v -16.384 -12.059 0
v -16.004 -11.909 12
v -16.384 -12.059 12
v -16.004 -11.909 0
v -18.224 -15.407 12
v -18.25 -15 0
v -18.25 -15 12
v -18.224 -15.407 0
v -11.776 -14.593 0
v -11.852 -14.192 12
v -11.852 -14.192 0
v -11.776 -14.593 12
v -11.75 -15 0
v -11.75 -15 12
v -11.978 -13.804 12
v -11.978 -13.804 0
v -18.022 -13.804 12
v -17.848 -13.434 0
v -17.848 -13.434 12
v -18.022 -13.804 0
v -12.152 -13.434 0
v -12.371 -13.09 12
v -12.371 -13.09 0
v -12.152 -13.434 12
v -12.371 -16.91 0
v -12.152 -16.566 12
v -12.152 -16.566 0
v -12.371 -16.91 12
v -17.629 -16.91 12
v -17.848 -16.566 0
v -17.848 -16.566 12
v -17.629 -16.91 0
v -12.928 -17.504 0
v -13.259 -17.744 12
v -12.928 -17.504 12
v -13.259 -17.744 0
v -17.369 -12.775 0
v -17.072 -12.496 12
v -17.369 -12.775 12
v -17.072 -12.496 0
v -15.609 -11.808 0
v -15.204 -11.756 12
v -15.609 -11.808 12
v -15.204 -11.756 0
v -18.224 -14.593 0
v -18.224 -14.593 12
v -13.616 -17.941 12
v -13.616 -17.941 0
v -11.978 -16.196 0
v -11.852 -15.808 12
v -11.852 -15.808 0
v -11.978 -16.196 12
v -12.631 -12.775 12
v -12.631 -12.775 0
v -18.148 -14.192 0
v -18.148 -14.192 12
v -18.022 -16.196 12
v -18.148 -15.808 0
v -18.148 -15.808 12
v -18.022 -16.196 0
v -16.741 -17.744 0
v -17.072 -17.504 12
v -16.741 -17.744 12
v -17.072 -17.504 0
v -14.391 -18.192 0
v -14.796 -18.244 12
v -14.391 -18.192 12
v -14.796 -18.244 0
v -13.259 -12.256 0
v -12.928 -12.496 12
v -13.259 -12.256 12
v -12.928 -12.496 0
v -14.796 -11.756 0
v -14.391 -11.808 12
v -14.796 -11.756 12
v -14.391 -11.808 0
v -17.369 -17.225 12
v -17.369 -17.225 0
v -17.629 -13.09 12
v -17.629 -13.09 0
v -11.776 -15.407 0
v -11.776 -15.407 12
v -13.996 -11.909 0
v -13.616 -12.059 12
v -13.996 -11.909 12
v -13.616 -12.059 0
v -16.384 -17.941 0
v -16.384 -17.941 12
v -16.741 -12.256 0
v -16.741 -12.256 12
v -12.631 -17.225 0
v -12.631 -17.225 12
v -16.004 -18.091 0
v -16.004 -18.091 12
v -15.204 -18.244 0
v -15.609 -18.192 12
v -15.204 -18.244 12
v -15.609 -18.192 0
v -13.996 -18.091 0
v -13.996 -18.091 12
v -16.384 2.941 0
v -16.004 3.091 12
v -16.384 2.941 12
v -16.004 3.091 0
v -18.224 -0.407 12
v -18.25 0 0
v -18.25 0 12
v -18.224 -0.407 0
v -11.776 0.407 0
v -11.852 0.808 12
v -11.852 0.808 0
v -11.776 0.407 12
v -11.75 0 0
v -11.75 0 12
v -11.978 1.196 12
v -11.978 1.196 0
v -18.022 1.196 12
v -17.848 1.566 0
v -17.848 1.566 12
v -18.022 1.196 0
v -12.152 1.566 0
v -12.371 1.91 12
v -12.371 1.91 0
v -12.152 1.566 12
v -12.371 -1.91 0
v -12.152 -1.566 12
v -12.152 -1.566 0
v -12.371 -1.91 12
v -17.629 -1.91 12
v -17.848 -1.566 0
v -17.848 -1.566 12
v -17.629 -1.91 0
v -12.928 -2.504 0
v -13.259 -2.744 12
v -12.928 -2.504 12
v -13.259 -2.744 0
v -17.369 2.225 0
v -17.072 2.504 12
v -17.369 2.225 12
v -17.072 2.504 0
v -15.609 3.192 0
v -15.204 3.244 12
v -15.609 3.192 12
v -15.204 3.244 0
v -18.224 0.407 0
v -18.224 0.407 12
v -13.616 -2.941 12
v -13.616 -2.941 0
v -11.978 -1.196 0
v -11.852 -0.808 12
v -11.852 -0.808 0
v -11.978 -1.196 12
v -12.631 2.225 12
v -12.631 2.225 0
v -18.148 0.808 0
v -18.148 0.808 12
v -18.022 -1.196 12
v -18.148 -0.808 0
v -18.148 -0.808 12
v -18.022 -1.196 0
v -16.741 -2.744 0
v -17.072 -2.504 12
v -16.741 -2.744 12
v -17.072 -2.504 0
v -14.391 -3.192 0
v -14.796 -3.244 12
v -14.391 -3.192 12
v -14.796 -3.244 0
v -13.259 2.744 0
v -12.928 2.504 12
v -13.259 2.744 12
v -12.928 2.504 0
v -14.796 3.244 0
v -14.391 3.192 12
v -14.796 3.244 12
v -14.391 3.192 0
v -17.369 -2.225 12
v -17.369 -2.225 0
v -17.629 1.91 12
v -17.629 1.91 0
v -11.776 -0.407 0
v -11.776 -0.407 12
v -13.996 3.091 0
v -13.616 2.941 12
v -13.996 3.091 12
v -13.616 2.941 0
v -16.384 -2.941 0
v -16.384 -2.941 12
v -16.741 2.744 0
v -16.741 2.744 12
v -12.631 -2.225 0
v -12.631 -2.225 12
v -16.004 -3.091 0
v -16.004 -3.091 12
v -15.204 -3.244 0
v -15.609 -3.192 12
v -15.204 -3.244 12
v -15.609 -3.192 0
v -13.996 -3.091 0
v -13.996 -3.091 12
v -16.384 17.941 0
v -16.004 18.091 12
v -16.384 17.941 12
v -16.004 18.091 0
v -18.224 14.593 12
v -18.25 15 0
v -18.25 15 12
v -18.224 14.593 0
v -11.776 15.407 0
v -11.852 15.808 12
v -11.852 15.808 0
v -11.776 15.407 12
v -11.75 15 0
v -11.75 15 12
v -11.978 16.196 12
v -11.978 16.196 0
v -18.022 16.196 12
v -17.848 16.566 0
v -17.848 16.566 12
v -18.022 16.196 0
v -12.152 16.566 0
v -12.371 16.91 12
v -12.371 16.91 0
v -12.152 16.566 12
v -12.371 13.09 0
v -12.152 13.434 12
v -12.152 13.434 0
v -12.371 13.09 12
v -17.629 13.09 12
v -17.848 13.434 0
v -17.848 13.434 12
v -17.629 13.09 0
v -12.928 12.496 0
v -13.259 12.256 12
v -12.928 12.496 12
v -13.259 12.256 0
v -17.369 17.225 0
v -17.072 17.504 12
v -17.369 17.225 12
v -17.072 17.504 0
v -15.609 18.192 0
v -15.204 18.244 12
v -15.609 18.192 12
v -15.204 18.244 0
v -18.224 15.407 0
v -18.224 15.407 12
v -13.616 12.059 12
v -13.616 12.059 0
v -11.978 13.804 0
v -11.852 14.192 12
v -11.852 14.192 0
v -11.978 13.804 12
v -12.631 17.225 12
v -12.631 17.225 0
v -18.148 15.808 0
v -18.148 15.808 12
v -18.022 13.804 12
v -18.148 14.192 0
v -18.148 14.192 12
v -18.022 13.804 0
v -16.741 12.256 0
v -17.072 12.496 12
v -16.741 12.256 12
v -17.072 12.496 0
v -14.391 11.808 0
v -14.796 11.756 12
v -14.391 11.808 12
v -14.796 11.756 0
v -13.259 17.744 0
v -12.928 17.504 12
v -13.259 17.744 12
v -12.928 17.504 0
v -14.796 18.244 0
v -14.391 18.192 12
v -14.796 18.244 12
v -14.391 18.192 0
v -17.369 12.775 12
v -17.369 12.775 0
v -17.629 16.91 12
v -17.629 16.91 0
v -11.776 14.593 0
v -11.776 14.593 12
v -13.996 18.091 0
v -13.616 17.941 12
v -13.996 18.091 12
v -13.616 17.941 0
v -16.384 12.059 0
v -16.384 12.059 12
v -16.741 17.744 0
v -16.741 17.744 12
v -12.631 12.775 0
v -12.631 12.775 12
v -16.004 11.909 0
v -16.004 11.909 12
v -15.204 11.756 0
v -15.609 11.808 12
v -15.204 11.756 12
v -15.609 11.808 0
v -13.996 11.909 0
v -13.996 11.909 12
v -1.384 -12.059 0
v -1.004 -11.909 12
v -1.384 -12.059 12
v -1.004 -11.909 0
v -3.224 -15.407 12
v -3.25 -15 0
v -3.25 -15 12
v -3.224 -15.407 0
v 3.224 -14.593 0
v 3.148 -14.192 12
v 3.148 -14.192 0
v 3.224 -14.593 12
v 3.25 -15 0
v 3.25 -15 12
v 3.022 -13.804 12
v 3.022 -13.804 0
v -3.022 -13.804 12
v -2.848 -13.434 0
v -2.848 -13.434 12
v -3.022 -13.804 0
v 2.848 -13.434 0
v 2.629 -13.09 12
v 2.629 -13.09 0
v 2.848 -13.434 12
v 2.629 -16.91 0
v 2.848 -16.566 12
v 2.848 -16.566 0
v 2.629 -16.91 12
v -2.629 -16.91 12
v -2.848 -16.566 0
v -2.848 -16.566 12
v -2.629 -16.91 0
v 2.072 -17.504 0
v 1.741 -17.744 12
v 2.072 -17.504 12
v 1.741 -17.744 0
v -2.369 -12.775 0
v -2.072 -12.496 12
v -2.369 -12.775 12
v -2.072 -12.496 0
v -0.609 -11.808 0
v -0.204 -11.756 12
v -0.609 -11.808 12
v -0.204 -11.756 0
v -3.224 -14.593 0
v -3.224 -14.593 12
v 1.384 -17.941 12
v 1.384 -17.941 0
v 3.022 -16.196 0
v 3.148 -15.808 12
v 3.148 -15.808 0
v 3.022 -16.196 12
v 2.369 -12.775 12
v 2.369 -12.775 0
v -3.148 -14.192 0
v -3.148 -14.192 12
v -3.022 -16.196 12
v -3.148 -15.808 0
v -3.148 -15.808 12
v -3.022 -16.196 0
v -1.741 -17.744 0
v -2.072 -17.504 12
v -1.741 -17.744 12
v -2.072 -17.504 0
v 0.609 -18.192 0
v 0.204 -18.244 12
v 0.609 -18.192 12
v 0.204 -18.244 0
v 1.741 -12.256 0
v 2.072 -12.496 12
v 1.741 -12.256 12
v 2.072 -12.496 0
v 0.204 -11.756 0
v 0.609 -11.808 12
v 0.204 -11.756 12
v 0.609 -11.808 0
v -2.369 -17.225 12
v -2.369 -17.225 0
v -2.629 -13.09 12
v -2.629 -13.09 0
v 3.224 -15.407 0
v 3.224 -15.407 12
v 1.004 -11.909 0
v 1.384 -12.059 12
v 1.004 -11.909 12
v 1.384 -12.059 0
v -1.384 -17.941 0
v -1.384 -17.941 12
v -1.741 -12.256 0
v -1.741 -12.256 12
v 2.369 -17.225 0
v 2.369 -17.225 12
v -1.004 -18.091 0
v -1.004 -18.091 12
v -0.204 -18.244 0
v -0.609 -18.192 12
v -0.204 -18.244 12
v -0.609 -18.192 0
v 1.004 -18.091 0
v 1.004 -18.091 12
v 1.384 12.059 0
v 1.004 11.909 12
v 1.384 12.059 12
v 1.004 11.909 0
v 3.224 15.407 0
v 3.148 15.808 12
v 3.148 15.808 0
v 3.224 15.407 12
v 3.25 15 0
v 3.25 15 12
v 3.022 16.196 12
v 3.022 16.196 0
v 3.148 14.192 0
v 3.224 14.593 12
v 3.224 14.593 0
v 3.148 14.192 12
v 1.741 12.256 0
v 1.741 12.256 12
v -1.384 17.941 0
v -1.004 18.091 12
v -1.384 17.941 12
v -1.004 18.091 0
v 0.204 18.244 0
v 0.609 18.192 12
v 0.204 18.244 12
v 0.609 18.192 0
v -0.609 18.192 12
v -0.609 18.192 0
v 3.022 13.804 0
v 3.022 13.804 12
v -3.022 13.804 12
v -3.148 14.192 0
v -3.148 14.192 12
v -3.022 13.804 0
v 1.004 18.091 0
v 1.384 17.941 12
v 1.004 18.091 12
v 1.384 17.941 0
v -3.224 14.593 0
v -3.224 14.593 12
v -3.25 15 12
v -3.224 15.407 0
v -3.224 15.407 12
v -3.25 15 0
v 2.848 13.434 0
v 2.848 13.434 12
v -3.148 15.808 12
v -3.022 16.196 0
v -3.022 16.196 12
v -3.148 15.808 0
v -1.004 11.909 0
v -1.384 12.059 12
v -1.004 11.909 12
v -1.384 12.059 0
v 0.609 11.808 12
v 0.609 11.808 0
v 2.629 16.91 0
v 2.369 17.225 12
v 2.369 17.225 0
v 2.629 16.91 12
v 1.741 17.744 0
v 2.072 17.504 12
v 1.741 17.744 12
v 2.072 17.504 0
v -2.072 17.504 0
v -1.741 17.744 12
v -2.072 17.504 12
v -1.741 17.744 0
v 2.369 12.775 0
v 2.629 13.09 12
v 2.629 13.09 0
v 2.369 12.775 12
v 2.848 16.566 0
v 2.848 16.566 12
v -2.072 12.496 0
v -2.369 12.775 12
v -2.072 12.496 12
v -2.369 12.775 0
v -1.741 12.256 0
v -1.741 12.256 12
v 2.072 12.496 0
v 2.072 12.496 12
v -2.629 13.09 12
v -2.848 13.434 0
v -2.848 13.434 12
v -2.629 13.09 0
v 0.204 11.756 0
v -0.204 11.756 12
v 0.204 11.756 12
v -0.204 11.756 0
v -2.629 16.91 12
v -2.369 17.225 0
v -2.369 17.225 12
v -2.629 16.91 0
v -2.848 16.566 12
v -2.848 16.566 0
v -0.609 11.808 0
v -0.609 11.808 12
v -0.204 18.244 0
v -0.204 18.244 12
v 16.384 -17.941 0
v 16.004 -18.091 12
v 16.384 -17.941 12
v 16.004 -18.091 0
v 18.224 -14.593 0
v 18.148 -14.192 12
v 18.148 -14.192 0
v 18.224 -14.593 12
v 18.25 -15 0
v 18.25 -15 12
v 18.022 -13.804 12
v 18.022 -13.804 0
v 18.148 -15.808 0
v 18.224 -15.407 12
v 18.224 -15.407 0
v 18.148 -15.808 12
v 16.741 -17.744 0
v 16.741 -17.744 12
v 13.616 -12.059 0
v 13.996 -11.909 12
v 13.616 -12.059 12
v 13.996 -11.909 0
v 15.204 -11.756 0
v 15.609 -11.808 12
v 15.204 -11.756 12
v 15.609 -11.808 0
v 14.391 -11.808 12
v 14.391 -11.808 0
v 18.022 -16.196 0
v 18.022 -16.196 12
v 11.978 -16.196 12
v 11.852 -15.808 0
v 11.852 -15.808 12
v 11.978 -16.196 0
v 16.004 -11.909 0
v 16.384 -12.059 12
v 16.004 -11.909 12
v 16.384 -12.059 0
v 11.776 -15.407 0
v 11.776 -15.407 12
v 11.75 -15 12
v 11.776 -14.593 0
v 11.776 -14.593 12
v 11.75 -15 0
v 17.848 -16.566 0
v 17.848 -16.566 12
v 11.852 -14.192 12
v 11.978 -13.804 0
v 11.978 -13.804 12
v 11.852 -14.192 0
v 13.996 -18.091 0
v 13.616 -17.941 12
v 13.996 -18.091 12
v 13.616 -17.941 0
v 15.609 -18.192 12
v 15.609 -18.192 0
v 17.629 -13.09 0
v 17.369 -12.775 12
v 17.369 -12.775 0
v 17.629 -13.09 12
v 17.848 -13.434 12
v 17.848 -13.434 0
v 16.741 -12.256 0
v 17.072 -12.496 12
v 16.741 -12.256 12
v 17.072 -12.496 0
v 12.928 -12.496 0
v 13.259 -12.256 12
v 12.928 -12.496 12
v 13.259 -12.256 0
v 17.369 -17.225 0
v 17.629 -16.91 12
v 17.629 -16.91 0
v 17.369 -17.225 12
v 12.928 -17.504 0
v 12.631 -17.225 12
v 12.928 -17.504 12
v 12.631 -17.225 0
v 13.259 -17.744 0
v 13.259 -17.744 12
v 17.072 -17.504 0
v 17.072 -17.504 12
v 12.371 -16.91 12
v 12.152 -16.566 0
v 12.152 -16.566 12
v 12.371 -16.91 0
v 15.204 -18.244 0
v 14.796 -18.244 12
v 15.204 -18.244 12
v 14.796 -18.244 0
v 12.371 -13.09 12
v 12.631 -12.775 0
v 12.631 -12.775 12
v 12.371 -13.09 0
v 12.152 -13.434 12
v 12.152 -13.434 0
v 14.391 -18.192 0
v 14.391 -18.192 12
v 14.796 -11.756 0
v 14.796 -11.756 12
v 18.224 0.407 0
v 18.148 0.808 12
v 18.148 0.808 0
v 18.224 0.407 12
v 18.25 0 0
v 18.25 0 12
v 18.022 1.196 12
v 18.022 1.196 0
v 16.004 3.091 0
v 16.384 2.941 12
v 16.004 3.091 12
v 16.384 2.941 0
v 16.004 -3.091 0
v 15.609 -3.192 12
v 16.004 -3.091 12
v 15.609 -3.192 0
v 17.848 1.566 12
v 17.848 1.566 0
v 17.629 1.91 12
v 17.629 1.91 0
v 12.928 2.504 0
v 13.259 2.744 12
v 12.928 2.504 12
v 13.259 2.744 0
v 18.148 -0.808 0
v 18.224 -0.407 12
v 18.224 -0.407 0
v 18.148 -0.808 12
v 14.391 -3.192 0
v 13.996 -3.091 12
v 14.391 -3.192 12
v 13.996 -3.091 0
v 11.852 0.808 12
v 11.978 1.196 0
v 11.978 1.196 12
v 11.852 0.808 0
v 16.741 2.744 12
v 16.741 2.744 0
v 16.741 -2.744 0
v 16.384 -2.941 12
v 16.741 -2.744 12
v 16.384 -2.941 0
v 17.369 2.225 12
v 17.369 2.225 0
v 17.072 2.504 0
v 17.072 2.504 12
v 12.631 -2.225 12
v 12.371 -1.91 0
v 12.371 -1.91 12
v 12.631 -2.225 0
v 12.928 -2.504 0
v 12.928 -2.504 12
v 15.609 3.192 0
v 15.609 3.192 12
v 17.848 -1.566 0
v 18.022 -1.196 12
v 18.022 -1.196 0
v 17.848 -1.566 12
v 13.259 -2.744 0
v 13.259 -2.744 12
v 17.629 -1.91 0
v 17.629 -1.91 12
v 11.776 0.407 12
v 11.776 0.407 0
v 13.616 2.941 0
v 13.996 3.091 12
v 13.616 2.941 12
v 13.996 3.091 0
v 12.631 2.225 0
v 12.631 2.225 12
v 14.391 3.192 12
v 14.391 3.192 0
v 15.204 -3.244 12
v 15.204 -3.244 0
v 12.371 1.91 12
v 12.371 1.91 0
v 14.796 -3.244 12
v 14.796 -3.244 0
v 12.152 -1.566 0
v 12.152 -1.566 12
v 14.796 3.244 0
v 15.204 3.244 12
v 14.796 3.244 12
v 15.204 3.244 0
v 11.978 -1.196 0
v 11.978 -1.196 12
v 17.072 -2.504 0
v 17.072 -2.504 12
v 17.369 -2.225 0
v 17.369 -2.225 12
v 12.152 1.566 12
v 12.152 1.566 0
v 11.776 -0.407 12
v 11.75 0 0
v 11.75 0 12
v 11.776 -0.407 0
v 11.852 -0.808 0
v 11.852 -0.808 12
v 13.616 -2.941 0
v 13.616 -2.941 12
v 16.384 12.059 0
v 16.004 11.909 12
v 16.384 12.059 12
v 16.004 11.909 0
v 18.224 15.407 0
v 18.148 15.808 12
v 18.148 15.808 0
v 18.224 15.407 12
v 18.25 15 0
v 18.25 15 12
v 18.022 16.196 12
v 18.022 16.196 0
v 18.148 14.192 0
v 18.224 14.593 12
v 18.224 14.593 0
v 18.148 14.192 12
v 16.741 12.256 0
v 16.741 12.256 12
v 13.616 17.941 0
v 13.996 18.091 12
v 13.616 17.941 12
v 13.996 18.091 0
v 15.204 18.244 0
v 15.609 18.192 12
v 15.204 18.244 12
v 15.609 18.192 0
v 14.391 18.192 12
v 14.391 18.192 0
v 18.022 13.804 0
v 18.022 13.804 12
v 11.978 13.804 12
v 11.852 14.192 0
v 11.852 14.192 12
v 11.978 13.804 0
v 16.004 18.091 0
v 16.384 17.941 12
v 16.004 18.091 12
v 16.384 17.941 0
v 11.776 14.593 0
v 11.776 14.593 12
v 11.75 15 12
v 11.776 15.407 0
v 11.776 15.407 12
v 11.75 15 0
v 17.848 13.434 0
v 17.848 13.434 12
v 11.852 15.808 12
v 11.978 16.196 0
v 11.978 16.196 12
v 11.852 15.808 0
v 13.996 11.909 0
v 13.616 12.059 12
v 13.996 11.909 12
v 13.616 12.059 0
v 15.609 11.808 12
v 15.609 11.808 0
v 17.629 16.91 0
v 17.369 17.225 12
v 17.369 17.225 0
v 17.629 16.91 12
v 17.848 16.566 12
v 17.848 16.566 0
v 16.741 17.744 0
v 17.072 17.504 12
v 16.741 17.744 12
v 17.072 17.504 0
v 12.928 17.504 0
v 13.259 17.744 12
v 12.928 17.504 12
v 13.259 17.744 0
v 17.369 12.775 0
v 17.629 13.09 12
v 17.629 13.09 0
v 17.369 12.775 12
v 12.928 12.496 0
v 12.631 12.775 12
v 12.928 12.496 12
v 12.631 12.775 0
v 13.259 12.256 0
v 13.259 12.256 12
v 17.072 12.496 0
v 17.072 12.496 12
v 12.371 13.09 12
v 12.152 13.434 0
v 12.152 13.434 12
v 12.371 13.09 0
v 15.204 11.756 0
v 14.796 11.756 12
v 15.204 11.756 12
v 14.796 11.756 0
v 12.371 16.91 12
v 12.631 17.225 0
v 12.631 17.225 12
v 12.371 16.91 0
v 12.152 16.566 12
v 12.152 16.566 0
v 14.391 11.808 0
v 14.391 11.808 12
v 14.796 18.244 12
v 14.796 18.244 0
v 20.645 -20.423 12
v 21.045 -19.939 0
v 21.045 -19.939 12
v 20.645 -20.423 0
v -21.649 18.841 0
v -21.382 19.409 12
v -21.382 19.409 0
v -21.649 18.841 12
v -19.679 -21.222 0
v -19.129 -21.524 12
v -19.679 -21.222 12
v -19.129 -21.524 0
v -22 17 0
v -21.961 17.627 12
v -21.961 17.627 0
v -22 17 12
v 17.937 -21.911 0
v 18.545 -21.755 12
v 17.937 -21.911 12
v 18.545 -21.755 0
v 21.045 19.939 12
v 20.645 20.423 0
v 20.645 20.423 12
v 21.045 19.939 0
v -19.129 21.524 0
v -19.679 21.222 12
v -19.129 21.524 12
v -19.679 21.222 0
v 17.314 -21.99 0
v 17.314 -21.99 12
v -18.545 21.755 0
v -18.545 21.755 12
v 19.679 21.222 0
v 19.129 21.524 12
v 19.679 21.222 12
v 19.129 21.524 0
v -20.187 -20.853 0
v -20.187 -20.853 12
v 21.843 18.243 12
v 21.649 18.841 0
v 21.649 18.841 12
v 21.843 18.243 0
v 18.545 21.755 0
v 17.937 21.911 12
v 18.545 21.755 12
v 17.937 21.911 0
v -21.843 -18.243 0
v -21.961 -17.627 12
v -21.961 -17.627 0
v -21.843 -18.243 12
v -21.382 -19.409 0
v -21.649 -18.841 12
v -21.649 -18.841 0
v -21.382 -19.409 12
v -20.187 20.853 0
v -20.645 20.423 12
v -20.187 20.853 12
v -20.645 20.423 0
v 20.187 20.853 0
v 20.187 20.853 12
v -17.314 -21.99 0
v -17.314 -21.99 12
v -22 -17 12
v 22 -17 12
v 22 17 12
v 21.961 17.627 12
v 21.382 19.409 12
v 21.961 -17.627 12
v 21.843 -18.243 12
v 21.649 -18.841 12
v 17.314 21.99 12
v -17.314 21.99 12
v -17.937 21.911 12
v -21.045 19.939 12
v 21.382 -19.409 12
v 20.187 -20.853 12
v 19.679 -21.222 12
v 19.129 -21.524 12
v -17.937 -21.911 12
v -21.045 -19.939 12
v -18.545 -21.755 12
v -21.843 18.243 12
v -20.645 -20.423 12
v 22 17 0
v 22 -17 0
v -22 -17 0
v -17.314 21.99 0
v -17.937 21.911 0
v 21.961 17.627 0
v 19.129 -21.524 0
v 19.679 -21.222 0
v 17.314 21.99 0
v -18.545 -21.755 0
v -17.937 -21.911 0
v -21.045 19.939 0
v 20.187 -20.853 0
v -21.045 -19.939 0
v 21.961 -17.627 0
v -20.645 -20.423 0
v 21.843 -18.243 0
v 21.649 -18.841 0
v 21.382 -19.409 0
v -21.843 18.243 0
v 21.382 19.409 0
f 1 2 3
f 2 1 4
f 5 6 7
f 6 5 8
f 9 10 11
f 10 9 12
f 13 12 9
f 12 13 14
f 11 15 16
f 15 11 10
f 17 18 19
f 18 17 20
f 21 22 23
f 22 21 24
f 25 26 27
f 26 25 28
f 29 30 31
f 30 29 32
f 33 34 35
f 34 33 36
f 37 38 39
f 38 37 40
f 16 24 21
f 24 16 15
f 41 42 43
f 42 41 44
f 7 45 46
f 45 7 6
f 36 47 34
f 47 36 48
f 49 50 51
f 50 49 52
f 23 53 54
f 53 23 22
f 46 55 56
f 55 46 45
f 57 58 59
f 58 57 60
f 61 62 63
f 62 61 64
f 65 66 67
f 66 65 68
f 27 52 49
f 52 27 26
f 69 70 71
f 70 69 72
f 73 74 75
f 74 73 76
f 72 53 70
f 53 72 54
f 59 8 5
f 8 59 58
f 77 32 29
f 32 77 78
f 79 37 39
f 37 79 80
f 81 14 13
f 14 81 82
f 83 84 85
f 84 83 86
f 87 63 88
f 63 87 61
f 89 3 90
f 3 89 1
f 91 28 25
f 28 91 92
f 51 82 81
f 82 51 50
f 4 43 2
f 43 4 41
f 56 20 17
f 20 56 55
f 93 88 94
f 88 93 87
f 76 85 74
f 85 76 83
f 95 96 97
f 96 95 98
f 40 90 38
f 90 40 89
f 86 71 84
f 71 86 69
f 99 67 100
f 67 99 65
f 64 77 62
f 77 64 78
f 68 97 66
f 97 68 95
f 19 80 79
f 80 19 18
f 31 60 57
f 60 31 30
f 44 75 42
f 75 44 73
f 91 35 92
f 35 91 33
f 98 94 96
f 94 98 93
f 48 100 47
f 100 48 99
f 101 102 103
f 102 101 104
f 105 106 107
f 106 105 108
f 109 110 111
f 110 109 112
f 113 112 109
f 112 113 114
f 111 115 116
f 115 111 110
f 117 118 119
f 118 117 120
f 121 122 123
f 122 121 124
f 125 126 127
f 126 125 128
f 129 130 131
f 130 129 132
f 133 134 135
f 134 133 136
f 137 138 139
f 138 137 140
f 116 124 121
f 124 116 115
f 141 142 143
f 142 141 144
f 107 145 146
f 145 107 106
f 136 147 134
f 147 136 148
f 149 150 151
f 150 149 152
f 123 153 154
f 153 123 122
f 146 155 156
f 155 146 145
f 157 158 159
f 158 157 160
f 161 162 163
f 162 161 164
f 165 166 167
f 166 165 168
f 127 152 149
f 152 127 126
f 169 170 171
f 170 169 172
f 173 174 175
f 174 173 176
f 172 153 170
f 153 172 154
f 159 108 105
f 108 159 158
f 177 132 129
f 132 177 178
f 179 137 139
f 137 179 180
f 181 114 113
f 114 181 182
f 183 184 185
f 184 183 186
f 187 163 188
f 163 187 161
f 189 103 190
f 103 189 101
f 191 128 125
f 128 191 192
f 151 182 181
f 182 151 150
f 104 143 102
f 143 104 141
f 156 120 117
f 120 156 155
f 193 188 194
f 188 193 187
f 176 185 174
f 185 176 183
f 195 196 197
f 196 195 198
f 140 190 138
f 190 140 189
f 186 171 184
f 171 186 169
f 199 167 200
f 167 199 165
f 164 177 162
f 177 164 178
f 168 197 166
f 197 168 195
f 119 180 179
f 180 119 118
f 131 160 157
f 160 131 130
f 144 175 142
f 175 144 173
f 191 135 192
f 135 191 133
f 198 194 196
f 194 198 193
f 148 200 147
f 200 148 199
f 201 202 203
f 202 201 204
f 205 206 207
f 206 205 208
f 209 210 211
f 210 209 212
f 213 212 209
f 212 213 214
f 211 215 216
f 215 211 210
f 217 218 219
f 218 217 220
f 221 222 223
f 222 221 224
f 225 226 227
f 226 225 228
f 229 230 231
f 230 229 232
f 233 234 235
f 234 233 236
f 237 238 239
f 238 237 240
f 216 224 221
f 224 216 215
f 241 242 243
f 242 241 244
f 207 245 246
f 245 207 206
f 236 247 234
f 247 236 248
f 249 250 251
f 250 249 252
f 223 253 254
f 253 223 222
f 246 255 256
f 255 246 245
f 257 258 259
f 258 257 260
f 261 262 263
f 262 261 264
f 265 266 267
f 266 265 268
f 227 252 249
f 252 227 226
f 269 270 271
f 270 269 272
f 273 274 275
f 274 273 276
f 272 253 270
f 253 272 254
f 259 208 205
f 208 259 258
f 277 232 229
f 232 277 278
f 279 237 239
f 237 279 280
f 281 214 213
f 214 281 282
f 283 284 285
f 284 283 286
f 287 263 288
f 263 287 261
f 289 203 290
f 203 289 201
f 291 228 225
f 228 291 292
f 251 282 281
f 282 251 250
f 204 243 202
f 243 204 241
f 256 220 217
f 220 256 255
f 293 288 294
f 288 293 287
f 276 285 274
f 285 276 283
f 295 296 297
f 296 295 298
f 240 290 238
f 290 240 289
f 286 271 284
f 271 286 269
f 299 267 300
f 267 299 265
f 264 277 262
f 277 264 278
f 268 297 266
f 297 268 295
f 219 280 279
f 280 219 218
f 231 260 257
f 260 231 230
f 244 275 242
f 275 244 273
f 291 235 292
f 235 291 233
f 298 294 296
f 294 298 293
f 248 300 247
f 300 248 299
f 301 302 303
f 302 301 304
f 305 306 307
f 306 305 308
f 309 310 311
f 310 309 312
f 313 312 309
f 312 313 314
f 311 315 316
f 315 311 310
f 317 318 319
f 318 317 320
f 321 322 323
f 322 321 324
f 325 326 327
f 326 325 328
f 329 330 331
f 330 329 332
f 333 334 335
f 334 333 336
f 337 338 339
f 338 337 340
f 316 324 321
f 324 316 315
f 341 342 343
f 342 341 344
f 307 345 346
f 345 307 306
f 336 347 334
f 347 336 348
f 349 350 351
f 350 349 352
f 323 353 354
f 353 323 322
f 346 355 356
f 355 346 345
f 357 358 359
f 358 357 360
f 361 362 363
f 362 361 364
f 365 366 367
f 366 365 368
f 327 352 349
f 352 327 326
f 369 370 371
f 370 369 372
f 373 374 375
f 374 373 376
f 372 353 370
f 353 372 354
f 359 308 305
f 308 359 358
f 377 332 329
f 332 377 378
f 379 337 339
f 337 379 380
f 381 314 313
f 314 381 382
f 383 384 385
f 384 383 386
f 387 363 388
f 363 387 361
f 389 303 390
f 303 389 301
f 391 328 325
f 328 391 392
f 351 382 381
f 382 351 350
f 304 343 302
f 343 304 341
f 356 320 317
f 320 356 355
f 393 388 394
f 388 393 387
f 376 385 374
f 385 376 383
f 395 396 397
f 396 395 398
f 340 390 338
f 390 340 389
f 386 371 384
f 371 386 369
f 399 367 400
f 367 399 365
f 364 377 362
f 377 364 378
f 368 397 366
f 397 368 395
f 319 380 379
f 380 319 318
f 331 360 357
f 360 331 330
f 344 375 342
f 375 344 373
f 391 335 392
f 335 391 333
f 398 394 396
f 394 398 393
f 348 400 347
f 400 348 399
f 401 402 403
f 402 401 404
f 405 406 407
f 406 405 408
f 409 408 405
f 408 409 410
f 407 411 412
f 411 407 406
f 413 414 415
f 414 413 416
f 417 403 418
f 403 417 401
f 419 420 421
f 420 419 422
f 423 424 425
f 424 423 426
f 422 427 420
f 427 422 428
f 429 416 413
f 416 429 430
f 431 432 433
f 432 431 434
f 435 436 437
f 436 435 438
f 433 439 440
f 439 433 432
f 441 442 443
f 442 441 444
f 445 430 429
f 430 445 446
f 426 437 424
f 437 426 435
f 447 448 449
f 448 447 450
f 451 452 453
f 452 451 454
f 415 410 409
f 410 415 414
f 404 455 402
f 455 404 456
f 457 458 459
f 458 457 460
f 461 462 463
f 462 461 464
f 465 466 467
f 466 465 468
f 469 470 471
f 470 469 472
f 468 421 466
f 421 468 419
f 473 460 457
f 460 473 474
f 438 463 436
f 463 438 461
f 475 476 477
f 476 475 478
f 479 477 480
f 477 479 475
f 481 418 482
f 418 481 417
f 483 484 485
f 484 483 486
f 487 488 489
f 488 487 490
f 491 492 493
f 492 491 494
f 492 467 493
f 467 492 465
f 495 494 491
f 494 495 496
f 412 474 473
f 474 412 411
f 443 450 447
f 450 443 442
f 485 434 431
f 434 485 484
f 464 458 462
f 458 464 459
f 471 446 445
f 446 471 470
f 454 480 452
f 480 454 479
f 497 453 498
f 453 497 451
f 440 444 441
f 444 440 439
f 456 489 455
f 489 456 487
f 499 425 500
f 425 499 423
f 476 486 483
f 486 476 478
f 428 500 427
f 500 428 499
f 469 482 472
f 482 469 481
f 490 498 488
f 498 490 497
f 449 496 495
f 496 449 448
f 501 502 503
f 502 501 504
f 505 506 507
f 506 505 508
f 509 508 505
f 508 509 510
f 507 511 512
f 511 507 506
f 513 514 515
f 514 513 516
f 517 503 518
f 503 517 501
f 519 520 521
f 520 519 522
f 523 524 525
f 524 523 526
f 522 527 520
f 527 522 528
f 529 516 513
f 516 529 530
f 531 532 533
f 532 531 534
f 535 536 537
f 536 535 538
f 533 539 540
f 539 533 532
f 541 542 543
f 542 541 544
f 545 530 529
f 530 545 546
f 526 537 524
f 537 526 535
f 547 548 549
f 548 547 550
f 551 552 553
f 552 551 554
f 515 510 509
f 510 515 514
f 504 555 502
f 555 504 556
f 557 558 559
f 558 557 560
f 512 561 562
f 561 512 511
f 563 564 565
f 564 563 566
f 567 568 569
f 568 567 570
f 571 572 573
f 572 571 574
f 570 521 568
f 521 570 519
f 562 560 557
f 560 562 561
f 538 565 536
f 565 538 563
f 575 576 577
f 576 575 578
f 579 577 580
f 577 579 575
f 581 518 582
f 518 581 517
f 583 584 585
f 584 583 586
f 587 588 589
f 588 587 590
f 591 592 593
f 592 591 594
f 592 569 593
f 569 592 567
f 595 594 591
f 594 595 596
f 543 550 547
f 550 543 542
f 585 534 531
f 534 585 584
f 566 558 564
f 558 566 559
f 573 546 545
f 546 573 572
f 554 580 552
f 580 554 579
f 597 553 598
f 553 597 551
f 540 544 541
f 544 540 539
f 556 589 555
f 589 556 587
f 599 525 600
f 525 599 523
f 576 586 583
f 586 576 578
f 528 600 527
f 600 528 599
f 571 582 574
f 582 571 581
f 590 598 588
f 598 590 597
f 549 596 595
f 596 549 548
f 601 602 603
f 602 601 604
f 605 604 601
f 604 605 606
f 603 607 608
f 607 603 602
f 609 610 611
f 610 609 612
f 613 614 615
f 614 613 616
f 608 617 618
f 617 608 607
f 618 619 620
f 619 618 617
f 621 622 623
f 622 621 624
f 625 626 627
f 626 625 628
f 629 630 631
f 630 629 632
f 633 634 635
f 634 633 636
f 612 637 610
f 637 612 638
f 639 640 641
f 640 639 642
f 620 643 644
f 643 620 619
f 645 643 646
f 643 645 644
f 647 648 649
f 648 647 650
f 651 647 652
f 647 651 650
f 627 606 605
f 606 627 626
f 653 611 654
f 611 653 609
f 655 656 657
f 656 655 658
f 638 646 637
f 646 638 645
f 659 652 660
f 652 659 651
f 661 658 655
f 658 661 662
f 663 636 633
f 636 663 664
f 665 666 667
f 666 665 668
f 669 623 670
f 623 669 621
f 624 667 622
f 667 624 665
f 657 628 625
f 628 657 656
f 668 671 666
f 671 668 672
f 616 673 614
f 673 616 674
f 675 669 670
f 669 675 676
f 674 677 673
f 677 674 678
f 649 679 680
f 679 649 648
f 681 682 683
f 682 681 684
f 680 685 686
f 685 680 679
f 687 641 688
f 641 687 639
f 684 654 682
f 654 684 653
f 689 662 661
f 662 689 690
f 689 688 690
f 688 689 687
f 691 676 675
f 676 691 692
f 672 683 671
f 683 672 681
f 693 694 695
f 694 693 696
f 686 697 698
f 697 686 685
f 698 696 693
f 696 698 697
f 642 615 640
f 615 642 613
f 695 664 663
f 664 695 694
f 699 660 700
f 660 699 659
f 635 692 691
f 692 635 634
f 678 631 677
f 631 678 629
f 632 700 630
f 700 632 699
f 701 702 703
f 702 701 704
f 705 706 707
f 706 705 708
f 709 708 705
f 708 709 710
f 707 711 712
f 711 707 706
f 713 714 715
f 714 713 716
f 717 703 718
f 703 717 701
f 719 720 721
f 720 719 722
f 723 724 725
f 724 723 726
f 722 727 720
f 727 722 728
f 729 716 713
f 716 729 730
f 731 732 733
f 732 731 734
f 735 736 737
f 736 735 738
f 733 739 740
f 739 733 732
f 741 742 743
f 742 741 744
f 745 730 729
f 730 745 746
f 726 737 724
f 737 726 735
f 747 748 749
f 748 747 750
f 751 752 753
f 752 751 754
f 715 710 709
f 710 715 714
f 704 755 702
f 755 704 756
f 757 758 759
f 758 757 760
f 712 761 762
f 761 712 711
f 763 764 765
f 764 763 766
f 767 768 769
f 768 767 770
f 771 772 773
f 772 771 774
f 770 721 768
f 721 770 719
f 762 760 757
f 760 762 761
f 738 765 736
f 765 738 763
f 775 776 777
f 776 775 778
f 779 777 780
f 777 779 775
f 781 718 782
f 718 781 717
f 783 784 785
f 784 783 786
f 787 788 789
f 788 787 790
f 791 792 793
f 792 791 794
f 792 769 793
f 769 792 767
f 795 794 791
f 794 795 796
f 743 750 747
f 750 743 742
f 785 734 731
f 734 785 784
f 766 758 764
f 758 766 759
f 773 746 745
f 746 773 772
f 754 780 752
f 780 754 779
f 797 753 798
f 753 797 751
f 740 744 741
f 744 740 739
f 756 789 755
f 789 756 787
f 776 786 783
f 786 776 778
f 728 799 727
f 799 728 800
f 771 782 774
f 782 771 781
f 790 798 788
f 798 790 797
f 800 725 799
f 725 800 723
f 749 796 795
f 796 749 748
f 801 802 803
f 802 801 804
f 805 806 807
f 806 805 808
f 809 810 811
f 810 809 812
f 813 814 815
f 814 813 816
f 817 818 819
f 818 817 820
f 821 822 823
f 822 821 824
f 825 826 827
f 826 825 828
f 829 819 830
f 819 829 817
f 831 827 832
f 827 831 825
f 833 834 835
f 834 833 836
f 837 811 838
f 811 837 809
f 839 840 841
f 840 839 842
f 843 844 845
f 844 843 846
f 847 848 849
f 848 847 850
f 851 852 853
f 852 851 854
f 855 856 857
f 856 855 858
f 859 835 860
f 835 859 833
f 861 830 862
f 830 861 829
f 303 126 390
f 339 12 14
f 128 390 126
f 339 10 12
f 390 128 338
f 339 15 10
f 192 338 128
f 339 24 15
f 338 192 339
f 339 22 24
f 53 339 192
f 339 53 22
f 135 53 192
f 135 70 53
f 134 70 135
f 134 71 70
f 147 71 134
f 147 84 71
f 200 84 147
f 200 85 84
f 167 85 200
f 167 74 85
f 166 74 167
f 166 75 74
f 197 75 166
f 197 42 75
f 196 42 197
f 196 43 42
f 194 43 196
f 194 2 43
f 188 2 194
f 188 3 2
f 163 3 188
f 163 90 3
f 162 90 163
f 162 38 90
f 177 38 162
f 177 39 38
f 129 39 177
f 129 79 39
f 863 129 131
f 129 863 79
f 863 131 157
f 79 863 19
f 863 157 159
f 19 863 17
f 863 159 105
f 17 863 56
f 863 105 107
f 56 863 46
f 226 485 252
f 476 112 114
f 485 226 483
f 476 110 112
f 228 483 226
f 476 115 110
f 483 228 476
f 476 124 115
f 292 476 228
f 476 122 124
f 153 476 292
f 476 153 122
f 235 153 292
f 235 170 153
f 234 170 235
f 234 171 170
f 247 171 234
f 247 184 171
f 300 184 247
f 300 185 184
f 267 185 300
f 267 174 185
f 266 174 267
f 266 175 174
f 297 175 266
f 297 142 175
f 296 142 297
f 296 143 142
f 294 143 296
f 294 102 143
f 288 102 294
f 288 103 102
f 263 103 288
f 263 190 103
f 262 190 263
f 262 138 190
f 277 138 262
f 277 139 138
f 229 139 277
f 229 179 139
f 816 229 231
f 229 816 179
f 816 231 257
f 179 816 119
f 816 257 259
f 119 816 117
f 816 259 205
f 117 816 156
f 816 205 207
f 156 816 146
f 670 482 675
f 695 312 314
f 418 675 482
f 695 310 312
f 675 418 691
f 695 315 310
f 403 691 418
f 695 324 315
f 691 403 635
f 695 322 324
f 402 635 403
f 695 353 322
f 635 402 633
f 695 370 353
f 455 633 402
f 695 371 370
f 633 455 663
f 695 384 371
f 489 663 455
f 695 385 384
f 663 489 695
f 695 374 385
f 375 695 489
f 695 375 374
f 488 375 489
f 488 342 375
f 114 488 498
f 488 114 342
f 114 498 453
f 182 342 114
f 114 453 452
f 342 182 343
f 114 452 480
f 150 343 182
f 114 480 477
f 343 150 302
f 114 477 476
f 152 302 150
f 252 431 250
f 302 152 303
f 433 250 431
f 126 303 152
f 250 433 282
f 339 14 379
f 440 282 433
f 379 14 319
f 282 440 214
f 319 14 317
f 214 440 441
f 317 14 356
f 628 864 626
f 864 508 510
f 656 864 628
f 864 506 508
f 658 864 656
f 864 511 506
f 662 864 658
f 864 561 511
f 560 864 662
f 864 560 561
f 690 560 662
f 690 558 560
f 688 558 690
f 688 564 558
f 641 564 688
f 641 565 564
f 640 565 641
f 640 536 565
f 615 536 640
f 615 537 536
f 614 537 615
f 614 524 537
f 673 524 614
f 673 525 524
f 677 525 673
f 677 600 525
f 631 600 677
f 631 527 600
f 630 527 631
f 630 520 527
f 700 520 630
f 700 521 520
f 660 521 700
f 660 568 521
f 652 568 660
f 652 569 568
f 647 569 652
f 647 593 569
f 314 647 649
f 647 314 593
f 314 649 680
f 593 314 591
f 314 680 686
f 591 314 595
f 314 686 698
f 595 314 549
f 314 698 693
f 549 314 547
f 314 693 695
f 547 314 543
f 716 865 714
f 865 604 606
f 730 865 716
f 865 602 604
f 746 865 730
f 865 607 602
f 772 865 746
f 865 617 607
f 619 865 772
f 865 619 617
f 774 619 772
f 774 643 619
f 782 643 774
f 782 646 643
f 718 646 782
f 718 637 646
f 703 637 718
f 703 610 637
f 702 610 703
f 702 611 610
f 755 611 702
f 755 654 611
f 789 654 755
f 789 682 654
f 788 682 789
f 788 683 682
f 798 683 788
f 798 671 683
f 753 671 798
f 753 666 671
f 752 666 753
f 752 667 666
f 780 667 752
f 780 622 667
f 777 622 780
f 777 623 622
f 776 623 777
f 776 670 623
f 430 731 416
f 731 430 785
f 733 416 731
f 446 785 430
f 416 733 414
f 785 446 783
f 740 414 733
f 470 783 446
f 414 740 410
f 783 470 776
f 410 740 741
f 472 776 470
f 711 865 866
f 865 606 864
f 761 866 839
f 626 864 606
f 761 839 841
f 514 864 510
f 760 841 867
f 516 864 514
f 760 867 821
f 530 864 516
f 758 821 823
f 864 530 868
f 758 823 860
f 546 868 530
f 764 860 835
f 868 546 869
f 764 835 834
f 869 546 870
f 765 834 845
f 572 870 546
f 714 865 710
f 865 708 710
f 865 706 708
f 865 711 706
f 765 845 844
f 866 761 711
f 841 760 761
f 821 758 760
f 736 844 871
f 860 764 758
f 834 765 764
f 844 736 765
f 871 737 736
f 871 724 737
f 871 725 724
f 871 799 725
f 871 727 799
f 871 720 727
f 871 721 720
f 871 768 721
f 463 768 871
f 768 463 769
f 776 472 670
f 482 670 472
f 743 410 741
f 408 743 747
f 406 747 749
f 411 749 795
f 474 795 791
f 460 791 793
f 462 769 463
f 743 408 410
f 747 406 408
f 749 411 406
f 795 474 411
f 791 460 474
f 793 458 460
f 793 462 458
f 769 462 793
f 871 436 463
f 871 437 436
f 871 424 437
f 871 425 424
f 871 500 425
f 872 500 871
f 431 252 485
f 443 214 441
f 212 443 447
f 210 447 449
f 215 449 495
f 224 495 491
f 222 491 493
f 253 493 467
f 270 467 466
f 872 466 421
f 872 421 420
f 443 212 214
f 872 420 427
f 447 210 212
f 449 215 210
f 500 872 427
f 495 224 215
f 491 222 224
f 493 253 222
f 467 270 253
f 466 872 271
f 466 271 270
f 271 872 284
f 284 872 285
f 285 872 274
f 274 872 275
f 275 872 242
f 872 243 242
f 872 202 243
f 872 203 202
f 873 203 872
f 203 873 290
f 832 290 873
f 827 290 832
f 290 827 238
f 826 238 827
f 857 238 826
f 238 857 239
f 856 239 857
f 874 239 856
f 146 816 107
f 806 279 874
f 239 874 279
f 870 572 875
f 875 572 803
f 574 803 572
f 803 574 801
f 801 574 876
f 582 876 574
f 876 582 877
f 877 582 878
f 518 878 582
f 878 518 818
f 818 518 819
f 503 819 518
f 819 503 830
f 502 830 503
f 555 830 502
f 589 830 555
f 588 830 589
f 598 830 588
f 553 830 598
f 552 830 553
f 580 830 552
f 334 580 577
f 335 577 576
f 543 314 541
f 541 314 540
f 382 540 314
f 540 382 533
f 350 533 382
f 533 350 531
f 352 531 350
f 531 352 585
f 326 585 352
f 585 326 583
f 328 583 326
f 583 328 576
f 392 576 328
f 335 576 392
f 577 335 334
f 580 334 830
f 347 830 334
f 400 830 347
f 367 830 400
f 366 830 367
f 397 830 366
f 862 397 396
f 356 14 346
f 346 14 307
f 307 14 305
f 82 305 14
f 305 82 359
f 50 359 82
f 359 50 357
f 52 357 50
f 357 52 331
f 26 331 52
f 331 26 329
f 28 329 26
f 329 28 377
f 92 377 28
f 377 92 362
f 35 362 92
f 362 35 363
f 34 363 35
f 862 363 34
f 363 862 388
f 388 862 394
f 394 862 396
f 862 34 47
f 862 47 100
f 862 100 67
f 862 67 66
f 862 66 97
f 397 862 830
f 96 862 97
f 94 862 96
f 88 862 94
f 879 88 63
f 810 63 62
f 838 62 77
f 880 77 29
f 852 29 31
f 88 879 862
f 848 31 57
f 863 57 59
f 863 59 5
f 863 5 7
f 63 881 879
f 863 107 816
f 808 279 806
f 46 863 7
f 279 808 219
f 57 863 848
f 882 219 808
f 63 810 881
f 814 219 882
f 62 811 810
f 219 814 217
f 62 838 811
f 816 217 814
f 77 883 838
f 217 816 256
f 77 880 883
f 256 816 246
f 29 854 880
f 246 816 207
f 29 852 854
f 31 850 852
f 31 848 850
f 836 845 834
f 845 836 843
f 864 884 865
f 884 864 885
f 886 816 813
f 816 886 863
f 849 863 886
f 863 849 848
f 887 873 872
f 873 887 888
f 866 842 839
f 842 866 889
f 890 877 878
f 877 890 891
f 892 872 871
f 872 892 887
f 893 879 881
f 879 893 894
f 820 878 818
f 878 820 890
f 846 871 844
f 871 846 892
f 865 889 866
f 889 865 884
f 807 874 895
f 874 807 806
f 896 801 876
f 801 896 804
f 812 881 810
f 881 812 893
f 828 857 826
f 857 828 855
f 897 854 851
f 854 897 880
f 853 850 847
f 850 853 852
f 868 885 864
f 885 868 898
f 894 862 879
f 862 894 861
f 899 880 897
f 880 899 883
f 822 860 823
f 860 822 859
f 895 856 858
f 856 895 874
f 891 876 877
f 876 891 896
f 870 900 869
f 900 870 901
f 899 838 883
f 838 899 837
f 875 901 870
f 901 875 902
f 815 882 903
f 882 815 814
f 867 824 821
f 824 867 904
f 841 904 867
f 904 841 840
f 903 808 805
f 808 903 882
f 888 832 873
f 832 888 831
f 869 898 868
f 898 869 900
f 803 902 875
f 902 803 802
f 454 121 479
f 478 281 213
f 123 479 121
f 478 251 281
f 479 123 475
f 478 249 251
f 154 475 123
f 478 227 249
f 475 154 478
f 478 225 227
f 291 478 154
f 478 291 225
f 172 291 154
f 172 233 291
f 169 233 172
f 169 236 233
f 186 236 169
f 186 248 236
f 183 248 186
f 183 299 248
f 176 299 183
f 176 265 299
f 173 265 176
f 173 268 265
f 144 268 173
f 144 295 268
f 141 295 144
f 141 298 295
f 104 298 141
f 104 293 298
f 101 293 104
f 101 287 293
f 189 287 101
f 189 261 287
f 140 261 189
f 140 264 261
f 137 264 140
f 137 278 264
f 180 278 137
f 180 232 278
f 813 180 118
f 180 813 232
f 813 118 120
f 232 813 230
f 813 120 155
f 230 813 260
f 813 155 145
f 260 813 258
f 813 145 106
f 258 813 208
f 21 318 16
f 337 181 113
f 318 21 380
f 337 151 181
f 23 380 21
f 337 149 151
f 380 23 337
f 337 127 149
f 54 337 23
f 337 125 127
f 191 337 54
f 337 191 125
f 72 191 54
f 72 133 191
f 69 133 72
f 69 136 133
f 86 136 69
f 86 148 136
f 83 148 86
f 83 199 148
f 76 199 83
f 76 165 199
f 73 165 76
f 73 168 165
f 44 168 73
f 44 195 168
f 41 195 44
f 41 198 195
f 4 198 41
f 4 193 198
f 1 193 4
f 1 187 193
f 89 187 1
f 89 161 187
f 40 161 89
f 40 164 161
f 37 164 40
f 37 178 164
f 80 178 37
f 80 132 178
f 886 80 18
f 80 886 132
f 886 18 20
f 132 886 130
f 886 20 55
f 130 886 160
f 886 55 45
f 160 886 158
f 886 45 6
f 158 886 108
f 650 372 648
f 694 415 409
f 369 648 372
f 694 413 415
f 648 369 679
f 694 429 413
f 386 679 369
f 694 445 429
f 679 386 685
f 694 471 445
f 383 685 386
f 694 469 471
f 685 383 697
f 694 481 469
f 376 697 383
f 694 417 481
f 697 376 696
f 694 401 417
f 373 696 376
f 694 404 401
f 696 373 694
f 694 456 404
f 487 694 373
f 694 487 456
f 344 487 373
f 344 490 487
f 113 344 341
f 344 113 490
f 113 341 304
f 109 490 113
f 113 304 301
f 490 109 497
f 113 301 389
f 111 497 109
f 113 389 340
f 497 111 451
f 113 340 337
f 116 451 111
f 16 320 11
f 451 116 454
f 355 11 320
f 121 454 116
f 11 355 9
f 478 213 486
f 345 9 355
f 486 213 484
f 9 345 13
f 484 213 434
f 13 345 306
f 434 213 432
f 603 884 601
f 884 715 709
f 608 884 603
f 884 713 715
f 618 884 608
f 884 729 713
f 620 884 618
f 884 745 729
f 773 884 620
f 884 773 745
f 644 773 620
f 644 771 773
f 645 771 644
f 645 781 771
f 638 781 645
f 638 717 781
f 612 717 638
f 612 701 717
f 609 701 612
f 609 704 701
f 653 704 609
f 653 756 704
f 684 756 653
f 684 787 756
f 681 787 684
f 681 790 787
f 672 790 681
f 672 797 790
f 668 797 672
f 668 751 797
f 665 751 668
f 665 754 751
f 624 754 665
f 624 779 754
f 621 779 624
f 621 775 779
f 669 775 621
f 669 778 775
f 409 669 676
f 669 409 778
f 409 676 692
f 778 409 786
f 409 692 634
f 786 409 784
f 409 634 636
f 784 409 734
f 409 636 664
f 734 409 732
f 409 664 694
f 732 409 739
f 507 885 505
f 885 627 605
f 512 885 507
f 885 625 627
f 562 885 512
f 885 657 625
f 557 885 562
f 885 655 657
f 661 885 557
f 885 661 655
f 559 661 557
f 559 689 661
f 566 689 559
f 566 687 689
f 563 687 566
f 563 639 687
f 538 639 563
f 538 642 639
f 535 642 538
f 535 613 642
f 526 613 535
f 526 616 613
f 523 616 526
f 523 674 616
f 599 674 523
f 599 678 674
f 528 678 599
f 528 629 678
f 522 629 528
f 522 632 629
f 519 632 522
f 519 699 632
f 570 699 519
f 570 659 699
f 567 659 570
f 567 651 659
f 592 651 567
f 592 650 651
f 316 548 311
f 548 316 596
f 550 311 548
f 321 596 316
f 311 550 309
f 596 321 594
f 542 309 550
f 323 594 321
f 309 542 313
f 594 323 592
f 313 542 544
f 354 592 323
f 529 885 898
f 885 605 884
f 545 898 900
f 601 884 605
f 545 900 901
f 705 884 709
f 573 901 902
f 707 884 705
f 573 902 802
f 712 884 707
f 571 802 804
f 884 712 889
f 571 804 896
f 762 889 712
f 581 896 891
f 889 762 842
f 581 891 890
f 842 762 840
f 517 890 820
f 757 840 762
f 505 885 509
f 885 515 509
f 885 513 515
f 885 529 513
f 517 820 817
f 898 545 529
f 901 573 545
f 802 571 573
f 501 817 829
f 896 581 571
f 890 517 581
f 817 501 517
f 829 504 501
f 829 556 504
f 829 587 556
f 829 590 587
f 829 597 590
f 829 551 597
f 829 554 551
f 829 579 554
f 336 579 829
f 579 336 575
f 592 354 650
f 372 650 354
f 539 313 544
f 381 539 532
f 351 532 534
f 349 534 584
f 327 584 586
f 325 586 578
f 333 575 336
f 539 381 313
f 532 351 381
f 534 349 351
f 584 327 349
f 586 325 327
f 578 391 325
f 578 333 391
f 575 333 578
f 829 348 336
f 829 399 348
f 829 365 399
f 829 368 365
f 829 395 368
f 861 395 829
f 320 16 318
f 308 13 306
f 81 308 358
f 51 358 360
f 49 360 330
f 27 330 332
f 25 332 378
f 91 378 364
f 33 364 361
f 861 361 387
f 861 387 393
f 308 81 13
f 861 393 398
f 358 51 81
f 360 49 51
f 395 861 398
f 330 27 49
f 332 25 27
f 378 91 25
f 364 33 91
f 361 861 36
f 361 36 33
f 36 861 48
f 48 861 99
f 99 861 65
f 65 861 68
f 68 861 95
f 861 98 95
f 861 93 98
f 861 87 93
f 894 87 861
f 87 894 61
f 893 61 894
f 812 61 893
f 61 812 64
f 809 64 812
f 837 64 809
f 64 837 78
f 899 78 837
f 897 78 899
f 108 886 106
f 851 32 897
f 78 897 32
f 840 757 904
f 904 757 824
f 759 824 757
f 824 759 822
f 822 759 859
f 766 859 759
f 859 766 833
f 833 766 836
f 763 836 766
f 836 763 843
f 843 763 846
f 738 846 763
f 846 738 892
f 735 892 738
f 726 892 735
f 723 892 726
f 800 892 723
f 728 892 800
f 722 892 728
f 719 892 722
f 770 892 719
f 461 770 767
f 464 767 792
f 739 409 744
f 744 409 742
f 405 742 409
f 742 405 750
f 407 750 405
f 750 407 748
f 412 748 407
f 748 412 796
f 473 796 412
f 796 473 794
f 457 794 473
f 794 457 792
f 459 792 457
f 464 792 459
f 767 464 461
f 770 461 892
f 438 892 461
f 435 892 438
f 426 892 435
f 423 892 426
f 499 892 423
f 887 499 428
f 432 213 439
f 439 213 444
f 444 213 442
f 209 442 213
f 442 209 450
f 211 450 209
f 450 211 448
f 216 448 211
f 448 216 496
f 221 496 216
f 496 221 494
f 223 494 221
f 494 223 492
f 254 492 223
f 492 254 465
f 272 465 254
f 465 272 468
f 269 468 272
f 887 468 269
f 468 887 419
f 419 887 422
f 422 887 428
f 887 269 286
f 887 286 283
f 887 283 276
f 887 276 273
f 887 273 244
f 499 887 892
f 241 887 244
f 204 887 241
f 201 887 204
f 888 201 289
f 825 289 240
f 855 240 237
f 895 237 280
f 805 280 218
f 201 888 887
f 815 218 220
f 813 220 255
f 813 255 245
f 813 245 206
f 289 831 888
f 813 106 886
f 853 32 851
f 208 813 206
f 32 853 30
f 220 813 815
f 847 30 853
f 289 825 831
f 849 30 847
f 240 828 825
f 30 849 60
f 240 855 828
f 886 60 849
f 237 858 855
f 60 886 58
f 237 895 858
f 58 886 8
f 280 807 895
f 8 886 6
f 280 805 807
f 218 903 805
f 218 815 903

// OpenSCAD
$fn = 50;


difference() {
	union() {
		hull() {
			translate(v = [-17.0000000000, 17.0000000000, 0]) {
				cylinder(h = 12, r = 5);
			}
			translate(v = [17.0000000000, 17.0000000000, 0]) {
				cylinder(h = 12, r = 5);
			}
			translate(v = [-17.0000000000, -17.0000000000, 0]) {
				cylinder(h = 12, r = 5);
			}
			translate(v = [17.0000000000, -17.0000000000, 0]) {
				cylinder(h = 12, r = 5);
			}
		}
	}
	union() {
		translate(v = [-15.0000000000, -15.0000000000, -100.0000000000]) {
			cylinder(h = 200, r = 3.2500000000);
		}
		translate(v = [-15.0000000000, 0.0000000000, -100.0000000000]) {
			cylinder(h = 200, r = 3.2500000000);
		}
		translate(v = [-15.0000000000, 15.0000000000, -100.0000000000]) {
			cylinder(h = 200, r = 3.2500000000);
		}
		translate(v = [0.0000000000, -15.0000000000, -100.0000000000]) {
			cylinder(h = 200, r = 3.2500000000);
		}
		translate(v = [0.0000000000, 15.0000000000, -100.0000000000]) {
			cylinder(h = 200, r = 3.2500000000);
		}
		translate(v = [15.0000000000, -15.0000000000, -100.0000000000]) {
			cylinder(h = 200, r = 3.2500000000);
		}
		translate(v = [15.0000000000, 0.0000000000, -100.0000000000]) {
			cylinder(h = 200, r = 3.2500000000);
		}
		translate(v = [15.0000000000, 15.0000000000, -100.0000000000]) {
			cylinder(h = 200, r = 3.2500000000);
		}
	}
}
